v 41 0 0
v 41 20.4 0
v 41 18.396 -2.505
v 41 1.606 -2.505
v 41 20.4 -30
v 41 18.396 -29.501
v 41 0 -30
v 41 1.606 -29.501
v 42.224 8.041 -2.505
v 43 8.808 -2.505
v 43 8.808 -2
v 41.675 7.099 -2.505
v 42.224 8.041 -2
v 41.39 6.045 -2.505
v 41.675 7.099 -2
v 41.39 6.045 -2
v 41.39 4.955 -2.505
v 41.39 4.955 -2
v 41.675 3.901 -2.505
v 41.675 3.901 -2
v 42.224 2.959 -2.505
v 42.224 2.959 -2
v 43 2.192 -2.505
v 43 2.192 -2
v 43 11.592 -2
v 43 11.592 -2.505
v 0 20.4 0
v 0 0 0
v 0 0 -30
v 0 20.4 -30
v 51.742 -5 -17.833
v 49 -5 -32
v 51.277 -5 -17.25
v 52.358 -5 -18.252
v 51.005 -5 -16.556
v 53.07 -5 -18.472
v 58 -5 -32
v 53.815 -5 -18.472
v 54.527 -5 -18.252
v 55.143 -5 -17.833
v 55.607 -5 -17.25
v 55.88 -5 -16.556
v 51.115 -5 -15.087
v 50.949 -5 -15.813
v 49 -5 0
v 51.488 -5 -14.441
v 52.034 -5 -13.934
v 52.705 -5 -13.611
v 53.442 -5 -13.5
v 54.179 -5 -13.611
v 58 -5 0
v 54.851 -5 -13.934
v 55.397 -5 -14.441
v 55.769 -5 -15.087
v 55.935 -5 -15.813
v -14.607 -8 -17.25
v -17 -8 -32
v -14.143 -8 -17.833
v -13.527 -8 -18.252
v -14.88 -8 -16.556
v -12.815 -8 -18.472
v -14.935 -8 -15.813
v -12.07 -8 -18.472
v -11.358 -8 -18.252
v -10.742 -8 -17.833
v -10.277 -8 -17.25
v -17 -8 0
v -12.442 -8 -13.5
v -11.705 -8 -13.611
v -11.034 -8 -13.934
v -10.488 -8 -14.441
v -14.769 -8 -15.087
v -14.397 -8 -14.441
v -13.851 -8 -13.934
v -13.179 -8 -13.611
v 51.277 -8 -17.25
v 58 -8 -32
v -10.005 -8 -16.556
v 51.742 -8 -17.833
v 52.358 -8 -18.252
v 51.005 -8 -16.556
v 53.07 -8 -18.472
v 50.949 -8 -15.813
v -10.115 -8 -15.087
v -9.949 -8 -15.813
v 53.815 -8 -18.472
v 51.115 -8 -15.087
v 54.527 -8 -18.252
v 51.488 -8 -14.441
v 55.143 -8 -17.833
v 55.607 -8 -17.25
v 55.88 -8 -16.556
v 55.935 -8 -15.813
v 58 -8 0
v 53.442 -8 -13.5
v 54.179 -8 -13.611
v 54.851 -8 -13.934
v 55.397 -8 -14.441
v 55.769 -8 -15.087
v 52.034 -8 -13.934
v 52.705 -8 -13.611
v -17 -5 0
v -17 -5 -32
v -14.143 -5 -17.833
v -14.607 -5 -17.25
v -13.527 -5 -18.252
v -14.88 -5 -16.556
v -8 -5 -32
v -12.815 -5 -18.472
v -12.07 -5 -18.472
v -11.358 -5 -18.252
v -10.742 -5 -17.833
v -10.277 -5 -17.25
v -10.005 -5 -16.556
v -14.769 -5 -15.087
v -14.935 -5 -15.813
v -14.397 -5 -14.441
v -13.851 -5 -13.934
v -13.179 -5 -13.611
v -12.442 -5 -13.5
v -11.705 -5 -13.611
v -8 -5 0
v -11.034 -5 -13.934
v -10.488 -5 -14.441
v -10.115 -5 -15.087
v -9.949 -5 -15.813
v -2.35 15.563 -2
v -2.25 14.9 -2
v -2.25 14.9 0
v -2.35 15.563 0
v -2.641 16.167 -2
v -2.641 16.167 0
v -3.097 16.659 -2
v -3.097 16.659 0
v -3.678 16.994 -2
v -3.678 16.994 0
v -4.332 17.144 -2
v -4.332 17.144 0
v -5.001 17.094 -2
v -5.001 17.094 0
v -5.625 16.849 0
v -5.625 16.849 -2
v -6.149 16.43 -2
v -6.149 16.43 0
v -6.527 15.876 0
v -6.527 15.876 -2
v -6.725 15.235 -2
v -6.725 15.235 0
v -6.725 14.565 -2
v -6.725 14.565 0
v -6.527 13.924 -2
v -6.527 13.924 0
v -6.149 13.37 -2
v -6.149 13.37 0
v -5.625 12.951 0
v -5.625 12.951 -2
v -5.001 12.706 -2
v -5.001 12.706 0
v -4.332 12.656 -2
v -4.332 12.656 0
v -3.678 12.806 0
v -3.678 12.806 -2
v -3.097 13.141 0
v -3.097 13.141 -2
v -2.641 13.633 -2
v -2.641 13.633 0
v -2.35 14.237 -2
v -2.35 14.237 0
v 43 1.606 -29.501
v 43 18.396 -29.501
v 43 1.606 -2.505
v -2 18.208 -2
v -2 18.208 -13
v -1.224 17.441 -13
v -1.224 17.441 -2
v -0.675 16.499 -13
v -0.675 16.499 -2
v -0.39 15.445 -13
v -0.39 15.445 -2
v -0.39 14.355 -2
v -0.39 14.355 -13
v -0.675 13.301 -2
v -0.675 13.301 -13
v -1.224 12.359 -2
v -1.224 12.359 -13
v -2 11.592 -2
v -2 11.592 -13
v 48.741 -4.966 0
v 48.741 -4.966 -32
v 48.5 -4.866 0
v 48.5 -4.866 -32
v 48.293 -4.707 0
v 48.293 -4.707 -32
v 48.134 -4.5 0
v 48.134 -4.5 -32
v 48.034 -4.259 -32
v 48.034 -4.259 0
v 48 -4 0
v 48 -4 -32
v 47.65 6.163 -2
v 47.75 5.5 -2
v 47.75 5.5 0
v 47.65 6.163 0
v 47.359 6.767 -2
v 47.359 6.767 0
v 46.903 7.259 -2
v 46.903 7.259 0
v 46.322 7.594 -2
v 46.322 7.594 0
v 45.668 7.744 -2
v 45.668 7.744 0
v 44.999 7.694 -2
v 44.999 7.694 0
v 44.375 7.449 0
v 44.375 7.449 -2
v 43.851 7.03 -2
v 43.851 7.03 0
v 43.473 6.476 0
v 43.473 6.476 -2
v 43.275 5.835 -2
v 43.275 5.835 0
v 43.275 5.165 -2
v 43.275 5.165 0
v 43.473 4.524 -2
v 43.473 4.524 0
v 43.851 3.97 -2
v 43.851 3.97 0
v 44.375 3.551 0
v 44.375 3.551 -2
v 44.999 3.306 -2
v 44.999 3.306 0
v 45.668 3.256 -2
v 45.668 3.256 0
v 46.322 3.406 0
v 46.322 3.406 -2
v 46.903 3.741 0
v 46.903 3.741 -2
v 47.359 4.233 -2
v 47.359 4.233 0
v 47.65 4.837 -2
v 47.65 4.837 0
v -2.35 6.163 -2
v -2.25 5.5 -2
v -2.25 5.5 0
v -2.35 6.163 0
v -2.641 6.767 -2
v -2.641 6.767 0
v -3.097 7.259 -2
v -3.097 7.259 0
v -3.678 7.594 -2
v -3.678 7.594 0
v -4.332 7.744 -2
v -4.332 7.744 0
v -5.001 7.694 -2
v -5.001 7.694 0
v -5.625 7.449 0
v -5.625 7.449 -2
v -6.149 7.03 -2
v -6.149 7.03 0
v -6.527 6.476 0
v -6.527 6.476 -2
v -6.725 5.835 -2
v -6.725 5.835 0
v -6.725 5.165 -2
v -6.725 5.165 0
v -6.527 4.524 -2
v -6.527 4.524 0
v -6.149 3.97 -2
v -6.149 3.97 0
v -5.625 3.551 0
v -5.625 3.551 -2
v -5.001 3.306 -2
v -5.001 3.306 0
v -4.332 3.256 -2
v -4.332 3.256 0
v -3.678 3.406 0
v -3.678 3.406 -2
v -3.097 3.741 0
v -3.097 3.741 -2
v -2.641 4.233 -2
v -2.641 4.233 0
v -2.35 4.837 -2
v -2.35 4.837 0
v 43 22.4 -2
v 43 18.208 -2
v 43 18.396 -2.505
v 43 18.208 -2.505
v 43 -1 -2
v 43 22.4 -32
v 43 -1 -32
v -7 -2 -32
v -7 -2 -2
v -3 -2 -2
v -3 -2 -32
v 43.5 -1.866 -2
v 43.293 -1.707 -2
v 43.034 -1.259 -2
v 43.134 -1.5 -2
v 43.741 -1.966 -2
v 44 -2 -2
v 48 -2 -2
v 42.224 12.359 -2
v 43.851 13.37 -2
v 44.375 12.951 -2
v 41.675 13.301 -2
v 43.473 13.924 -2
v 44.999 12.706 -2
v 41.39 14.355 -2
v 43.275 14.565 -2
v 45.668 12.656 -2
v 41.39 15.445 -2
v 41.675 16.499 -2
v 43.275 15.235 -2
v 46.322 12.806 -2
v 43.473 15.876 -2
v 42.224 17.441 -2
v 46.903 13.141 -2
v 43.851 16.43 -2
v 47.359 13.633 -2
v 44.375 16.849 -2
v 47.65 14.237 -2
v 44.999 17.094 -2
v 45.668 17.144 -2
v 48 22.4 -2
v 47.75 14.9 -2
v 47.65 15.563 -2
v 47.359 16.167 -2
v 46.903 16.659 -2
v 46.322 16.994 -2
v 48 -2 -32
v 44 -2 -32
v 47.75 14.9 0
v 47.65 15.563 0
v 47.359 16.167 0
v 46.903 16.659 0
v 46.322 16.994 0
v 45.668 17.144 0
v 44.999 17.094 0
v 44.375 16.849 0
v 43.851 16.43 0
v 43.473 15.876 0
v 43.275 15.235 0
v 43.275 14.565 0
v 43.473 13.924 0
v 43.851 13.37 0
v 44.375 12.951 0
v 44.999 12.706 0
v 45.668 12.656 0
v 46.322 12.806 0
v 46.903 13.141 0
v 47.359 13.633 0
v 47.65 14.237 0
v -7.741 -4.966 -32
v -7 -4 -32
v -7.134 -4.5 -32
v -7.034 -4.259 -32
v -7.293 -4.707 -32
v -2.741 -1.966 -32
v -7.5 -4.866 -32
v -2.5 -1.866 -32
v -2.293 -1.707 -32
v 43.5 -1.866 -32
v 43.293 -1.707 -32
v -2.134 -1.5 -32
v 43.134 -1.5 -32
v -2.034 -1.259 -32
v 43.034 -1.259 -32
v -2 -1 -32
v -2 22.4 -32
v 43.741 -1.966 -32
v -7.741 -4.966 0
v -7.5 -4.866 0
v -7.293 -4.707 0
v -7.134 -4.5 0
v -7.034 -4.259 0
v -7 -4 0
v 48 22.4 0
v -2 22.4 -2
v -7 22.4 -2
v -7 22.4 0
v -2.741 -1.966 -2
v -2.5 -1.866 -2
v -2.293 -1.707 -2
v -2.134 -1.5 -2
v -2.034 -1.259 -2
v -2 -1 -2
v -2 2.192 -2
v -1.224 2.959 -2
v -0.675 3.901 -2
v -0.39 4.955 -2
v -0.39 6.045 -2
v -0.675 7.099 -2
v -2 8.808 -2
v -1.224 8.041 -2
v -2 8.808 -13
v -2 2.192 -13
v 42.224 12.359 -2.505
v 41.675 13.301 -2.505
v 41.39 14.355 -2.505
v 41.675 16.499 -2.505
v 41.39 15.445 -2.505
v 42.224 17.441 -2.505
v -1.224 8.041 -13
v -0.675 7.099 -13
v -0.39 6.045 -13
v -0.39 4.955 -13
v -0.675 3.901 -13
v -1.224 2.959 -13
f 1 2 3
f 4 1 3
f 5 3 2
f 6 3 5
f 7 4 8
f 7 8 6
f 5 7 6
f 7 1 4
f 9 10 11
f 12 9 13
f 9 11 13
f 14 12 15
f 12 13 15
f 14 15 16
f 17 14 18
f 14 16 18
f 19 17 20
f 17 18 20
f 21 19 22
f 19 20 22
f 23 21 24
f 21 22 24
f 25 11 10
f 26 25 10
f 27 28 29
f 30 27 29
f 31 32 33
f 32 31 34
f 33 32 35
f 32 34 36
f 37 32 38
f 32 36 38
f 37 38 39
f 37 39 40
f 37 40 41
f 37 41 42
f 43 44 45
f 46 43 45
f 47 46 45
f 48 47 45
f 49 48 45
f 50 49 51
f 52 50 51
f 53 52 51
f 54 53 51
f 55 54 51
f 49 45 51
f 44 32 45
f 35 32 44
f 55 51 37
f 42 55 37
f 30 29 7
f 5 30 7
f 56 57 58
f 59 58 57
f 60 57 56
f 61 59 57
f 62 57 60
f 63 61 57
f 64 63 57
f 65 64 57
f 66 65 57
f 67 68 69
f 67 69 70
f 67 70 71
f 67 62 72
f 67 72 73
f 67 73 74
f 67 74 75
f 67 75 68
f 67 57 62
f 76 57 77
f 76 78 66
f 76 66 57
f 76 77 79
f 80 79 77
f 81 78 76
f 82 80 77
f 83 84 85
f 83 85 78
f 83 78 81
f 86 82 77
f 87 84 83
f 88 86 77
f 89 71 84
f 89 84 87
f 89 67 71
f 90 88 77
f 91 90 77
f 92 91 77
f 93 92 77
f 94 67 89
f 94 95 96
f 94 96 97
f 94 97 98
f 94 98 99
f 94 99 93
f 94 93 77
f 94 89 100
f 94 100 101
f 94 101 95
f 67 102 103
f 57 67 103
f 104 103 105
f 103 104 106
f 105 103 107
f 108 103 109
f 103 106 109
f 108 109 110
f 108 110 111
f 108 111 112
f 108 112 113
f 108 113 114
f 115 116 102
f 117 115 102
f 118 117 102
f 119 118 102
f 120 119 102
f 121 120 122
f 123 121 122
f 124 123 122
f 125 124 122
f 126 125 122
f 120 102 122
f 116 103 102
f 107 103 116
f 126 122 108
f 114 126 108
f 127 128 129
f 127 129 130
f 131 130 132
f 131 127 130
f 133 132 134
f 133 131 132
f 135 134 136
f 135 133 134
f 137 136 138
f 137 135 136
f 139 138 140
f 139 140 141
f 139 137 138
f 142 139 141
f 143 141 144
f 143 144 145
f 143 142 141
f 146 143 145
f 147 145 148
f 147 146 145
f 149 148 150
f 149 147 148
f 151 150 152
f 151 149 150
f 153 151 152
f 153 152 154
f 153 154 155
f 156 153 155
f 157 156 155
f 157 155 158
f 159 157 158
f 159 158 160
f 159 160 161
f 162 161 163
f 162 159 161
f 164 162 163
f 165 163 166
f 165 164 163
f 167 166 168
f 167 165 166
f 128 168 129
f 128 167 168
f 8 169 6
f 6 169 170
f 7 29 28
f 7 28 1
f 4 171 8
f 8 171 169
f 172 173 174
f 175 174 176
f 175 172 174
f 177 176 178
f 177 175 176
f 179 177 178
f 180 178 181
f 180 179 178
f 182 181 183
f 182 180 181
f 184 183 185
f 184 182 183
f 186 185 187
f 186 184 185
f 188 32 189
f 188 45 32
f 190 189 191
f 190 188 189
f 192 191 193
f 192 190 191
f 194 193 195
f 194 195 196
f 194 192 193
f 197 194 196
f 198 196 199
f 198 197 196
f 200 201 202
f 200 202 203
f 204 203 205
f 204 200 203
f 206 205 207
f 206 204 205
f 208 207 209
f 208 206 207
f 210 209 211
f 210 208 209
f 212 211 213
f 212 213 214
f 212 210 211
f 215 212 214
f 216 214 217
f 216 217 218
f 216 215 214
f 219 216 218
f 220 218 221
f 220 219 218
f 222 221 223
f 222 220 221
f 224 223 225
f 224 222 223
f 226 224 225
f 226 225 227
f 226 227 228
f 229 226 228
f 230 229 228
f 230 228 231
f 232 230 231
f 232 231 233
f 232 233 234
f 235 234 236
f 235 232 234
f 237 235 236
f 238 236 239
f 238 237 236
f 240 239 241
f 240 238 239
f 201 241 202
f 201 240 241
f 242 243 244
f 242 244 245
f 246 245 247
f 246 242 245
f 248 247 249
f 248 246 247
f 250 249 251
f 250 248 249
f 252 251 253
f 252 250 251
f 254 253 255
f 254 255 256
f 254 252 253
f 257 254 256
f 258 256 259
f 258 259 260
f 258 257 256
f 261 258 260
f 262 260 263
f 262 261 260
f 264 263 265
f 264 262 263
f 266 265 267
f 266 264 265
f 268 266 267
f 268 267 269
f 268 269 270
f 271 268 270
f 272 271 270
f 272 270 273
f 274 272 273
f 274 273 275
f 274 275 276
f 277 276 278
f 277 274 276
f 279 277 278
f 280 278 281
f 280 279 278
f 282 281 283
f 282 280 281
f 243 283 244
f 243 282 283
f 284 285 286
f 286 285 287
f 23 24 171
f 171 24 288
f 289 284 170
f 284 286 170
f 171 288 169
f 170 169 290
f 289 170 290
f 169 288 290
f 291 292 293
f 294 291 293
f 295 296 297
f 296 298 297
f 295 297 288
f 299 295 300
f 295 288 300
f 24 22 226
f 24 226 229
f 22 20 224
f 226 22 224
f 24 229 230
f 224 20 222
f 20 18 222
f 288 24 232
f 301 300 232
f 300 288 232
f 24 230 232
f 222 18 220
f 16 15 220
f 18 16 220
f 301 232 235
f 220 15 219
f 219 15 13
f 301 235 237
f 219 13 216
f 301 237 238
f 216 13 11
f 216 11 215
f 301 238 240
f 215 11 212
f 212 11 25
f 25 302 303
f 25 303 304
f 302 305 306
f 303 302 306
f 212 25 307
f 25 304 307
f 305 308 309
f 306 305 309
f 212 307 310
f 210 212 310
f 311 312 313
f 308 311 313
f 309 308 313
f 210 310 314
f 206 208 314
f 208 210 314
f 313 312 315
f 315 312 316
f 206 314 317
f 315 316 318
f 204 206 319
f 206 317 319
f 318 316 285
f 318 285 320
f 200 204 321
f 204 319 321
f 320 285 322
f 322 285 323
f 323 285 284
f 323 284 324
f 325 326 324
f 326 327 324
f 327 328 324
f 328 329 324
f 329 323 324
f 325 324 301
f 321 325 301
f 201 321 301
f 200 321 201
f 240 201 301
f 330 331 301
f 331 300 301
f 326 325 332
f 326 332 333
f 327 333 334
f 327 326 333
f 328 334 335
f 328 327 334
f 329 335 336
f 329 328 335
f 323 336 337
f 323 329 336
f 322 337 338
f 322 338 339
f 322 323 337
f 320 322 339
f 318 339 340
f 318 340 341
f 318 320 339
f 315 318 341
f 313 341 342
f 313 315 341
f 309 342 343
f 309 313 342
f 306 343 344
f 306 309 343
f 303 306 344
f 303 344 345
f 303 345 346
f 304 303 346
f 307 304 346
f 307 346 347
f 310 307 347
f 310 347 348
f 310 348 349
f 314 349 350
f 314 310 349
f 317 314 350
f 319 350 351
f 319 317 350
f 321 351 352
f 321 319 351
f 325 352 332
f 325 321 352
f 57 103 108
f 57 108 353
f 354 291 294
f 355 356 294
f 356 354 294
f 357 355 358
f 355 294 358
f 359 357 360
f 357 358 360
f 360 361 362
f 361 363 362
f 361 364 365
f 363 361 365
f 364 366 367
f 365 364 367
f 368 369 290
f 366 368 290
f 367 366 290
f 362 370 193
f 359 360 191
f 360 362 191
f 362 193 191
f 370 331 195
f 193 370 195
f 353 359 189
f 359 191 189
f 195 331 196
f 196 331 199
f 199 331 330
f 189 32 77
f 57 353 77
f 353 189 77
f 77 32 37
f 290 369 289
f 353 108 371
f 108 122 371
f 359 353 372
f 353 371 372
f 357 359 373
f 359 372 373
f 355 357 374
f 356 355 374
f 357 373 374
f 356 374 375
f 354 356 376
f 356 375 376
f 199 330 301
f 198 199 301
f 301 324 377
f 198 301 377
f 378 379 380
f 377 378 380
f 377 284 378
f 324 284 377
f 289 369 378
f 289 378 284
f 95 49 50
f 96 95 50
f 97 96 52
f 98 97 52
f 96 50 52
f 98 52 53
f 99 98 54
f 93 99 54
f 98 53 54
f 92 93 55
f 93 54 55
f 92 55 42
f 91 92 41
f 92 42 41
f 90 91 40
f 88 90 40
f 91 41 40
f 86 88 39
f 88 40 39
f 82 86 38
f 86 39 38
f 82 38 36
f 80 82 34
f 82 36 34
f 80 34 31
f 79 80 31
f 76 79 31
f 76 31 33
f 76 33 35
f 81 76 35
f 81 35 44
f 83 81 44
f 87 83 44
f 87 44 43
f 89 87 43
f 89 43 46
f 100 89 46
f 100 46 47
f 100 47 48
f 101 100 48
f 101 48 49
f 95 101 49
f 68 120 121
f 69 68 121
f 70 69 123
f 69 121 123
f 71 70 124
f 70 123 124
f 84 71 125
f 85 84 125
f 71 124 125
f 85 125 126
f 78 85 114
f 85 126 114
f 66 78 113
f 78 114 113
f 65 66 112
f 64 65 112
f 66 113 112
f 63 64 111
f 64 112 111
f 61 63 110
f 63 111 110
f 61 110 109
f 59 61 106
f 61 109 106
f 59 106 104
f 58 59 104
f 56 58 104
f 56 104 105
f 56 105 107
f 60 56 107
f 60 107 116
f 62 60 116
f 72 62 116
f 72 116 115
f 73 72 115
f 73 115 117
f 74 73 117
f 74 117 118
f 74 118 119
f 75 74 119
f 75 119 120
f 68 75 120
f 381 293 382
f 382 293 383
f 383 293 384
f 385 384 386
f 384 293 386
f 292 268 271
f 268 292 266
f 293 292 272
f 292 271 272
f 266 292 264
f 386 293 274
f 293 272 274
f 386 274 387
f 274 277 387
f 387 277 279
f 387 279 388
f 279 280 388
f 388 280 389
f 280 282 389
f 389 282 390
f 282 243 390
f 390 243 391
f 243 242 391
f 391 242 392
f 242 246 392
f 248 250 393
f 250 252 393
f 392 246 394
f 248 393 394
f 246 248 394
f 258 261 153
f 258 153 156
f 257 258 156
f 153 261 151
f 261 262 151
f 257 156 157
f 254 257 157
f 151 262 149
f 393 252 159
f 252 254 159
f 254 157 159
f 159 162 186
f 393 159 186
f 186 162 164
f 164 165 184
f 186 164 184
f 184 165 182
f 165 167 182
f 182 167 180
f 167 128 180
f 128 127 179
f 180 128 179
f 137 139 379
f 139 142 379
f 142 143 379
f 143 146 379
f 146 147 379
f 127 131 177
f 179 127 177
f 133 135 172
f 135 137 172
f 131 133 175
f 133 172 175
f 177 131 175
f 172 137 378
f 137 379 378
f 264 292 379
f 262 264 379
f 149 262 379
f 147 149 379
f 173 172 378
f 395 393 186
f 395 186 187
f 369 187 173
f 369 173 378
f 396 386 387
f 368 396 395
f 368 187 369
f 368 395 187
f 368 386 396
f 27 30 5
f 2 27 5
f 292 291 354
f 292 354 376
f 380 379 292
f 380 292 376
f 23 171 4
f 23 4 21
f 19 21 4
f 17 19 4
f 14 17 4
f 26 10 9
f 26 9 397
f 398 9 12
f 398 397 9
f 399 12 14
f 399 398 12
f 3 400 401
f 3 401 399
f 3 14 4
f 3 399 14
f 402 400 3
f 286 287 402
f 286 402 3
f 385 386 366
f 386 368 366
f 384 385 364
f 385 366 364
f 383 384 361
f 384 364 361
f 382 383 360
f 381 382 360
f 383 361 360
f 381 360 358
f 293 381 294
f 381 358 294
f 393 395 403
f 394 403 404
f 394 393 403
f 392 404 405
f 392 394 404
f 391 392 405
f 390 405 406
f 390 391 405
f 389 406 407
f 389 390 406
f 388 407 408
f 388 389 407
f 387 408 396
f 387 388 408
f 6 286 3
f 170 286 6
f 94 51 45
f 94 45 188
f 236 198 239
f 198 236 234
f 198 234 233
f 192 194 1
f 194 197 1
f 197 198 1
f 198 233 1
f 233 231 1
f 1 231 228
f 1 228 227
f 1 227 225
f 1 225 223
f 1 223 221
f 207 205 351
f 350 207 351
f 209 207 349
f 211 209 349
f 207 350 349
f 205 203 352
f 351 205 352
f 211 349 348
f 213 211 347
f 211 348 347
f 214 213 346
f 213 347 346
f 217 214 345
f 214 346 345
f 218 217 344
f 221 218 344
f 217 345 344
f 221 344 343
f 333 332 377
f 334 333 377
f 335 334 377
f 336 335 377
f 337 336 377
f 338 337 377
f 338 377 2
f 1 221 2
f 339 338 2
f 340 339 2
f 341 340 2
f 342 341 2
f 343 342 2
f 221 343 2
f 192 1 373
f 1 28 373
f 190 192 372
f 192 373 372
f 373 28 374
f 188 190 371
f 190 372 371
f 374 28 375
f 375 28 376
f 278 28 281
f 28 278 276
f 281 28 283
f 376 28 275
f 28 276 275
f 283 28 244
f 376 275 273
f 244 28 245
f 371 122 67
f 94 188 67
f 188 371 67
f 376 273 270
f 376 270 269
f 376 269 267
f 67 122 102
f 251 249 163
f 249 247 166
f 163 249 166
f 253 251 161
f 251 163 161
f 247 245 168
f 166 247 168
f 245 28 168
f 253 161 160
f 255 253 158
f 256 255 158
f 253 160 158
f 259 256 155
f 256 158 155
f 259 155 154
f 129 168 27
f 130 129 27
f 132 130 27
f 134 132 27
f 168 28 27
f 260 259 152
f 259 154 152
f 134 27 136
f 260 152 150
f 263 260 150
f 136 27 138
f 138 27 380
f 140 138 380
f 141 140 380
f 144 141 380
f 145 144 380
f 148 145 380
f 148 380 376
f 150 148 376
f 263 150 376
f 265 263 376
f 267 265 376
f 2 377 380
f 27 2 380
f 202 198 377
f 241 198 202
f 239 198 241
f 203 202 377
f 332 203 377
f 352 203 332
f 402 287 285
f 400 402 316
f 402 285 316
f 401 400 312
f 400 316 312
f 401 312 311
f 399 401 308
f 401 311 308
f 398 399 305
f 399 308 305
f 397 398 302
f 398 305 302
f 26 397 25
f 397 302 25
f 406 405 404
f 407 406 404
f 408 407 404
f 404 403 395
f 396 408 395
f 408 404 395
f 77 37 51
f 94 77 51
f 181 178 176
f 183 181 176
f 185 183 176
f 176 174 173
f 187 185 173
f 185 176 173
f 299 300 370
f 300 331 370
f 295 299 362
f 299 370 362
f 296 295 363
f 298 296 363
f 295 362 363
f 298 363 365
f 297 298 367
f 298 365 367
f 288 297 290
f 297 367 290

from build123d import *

# Parameters (mm, degrees)
SKETCH1_W               = 41
SKETCH1_H               = 30
BOSS_EXTRUDE1_DEPTH     = 20.4
SHELL1_T                = 2
BOSS_EXTRUDE2_START     = -2
BOSS_EXTRUDE2_OUTLINE_W = 5
BOSS_EXTRUDE2_OUTLINE_H = 20.4
BOSS_EXTRUDE2_OUTLINE_R = 2.25
BOSS_EXTRUDE2_DEPTH     = 2
SKETCH3_W               = 5
SKETCH3_H               = 2
BOSS_EXTRUDE3_DEPTH     = 2
SKETCH4_W               = 5
SKETCH4_H               = 2
BOSS_EXTRUDE4_DEPTH     = 2
SKETCH5_W               = 5
SKETCH5_H               = 2
BOSS_EXTRUDE5_DEPTH     = 2
SKETCH6_W               = 5
SKETCH6_H               = 2
BOSS_EXTRUDE6_DEPTH     = 2
SKETCH7_W               = 5
SKETCH7_H               = 30
BOSS_EXTRUDE7_DEPTH     = 1
SKETCH9_R               = 4.146052681
CUT_EXTRUDE4_DEPTH      = 11
SKETCH10_W              = 55
SKETCH10_H              = 32
BOSS_EXTRUDE9_DEPTH     = 2
BOSS_EXTRUDE10_DEPTH    = 3
FILLET1_R               = 1
SKETCH18_W              = 26.995153054
SKETCH18_H              = 16.789310936
CUT_EXTRUDE5_DEPTH      = 10
SKETCH20_R              = 2.5
CUT_EXTRUDE7_DEPTH      = 10


# Read off the part's stored shape, not the designer's step: Boss-Extrude2
with BuildPart() as part:
    # Sketch1 → Boss-Extrude1 (new body)
    with BuildSketch(Plane(origin=(0, 0, 0), x_dir=(1, 0, 0), z_dir=(0, 1, 0))):
        with Locations((20.5, 15)):
            Rectangle(SKETCH1_W, SKETCH1_H)
    extrude(amount=BOSS_EXTRUDE1_DEPTH)

    # Shell1
    shell1_openings = [part.faces().sort_by_distance(p)[0] for p in [
        (20.5, 10.2, 0),
    ]]
    offset(amount=SHELL1_T, openings=shell1_openings, kind=Kind.INTERSECTION)

    # Boss-Extrude2 outline → Boss-Extrude2 (add)
    # profile 1 of 2: a face of its own
    with BuildSketch(Plane.XY.offset(BOSS_EXTRUDE2_START)):
        with Locations((-4.5, 10.2)):
            Rectangle(BOSS_EXTRUDE2_OUTLINE_W, BOSS_EXTRUDE2_OUTLINE_H)
        with Locations((-4.5, 5.5)):
            Circle(BOSS_EXTRUDE2_OUTLINE_R, mode=Mode.SUBTRACT)
        with Locations((-4.5, 14.9)):
            Circle(BOSS_EXTRUDE2_OUTLINE_R, mode=Mode.SUBTRACT)
    # profile 2 of 2: a face of its own
    with BuildSketch(Plane.XY.offset(BOSS_EXTRUDE2_START)):
        with Locations((45.5, 10.2)):
            Rectangle(BOSS_EXTRUDE2_OUTLINE_W, BOSS_EXTRUDE2_OUTLINE_H)
        with Locations((45.5, 5.5)):
            Circle(BOSS_EXTRUDE2_OUTLINE_R, mode=Mode.SUBTRACT)
        with Locations((45.5, 14.9)):
            Circle(BOSS_EXTRUDE2_OUTLINE_R, mode=Mode.SUBTRACT)
    extrude(amount=BOSS_EXTRUDE2_DEPTH)

    # Sketch3 → Boss-Extrude3 (add)
    with BuildSketch(Plane(origin=(0, 20.4, 0), x_dir=(1, 0, 0), z_dir=(0, 1, 0))):
        with Locations((-4.5, 1)):
            Rectangle(SKETCH3_W, SKETCH3_H)
    extrude(amount=BOSS_EXTRUDE3_DEPTH)

    # Sketch4 → Boss-Extrude4 (add)
    with BuildSketch(Plane.XZ):
        with Locations((-4.5, -1)):
            Rectangle(SKETCH4_W, SKETCH4_H)
    extrude(amount=BOSS_EXTRUDE4_DEPTH)

    # Sketch5 → Boss-Extrude5 (add)
    with BuildSketch(Plane(origin=(0, 20.4, 0), x_dir=(1, 0, 0), z_dir=(0, 1, 0))):
        with Locations((45.5, 1)):
            Rectangle(SKETCH5_W, SKETCH5_H)
    extrude(amount=BOSS_EXTRUDE5_DEPTH)

    # Sketch6 → Boss-Extrude6 (add)
    with BuildSketch(Plane.XZ):
        with Locations((45.5, -1)):
            Rectangle(SKETCH6_W, SKETCH6_H)
    extrude(amount=BOSS_EXTRUDE6_DEPTH)

    # Sketch7 → Boss-Extrude7 (add)
    with BuildSketch(Plane.XZ.offset(2)):
        Polygon((-7, -2), (-2, -2), (-2, -32), (43, -32), (43, -2), (48, -2), (48, 0), (-7, 0), align=None)
        with Locations((-4.5, -17)):
            Rectangle(SKETCH7_W, SKETCH7_H)
        with Locations((45.5, -17)):
            Rectangle(SKETCH7_W, SKETCH7_H)
    extrude(amount=BOSS_EXTRUDE7_DEPTH)

    # Sketch9 → Cut-Extrude4 (cut)
    with BuildSketch(Plane(origin=(0, 0, -2), x_dir=(-1, 0, 0), z_dir=(0, 0, -1))):
        with Locations((4.5, 5.5)):
            Circle(SKETCH9_R)
        with Locations((4.5, 14.9)):
            Circle(SKETCH9_R)
    cut_extrude4 = extrude(amount=CUT_EXTRUDE4_DEPTH, mode=Mode.SUBTRACT)

    # Mirror1: Cut-Extrude4 across plane
    add(cut_extrude4.mirror(Plane(origin=(20.5, 0, 0), x_dir=(0, 0, 1), z_dir=(1, 0, 0))), mode=Mode.SUBTRACT)

    # Sketch10 → Boss-Extrude9 (add)
    with BuildSketch(Plane.XZ.offset(3)):
        with Locations((20.5, -16)):
            Rectangle(SKETCH10_W, SKETCH10_H)
    extrude(amount=BOSS_EXTRUDE9_DEPTH)

    # Sketch11 → Boss-Extrude10 (add)
    with BuildSketch(Plane.XZ.offset(5)):
        Polygon((48, 0), (-7, 0), (-17, 0), (-17, -32), (-7, -32), (48, -32), (58, -32), (58, 0), align=None)
    extrude(amount=BOSS_EXTRUDE10_DEPTH)

    # Fillet1
    fillet1_edges = [part.edges().sort_by_distance(p)[0] for p in [
        (43, -2, -17),
        (-7, -5, -16),
        (48, -5, -16),
        (-2, -2, -17),
    ]]
    fillet(fillet1_edges, radius=FILLET1_R)

    # Sketch18 → Cut-Extrude5 (cut)
    with BuildSketch(Plane(origin=(43, 0, 0), x_dir=(0, 0, -1), z_dir=(1, 0, 0))):
        with Locations((16.002935908, 10.000980191)):
            Rectangle(SKETCH18_W, SKETCH18_H)
    extrude(amount=-CUT_EXTRUDE5_DEPTH, mode=Mode.SUBTRACT)

    # Sketch20 → Cut-Extrude7 (cut)
    with BuildSketch(Plane(origin=(0, 0, 0), x_dir=(1, 0, 0), z_dir=(0, 1, 0))):
        with Locations(Location((-12.442315246, 16, 0), (0, 0, 270))):
            Circle(SKETCH20_R)
        with Locations(Location((53.442315246, 16, 0), (0, 0, 270))):
            Circle(SKETCH20_R)
    extrude(amount=-CUT_EXTRUDE7_DEPTH, mode=Mode.SUBTRACT)


solid = part.part
